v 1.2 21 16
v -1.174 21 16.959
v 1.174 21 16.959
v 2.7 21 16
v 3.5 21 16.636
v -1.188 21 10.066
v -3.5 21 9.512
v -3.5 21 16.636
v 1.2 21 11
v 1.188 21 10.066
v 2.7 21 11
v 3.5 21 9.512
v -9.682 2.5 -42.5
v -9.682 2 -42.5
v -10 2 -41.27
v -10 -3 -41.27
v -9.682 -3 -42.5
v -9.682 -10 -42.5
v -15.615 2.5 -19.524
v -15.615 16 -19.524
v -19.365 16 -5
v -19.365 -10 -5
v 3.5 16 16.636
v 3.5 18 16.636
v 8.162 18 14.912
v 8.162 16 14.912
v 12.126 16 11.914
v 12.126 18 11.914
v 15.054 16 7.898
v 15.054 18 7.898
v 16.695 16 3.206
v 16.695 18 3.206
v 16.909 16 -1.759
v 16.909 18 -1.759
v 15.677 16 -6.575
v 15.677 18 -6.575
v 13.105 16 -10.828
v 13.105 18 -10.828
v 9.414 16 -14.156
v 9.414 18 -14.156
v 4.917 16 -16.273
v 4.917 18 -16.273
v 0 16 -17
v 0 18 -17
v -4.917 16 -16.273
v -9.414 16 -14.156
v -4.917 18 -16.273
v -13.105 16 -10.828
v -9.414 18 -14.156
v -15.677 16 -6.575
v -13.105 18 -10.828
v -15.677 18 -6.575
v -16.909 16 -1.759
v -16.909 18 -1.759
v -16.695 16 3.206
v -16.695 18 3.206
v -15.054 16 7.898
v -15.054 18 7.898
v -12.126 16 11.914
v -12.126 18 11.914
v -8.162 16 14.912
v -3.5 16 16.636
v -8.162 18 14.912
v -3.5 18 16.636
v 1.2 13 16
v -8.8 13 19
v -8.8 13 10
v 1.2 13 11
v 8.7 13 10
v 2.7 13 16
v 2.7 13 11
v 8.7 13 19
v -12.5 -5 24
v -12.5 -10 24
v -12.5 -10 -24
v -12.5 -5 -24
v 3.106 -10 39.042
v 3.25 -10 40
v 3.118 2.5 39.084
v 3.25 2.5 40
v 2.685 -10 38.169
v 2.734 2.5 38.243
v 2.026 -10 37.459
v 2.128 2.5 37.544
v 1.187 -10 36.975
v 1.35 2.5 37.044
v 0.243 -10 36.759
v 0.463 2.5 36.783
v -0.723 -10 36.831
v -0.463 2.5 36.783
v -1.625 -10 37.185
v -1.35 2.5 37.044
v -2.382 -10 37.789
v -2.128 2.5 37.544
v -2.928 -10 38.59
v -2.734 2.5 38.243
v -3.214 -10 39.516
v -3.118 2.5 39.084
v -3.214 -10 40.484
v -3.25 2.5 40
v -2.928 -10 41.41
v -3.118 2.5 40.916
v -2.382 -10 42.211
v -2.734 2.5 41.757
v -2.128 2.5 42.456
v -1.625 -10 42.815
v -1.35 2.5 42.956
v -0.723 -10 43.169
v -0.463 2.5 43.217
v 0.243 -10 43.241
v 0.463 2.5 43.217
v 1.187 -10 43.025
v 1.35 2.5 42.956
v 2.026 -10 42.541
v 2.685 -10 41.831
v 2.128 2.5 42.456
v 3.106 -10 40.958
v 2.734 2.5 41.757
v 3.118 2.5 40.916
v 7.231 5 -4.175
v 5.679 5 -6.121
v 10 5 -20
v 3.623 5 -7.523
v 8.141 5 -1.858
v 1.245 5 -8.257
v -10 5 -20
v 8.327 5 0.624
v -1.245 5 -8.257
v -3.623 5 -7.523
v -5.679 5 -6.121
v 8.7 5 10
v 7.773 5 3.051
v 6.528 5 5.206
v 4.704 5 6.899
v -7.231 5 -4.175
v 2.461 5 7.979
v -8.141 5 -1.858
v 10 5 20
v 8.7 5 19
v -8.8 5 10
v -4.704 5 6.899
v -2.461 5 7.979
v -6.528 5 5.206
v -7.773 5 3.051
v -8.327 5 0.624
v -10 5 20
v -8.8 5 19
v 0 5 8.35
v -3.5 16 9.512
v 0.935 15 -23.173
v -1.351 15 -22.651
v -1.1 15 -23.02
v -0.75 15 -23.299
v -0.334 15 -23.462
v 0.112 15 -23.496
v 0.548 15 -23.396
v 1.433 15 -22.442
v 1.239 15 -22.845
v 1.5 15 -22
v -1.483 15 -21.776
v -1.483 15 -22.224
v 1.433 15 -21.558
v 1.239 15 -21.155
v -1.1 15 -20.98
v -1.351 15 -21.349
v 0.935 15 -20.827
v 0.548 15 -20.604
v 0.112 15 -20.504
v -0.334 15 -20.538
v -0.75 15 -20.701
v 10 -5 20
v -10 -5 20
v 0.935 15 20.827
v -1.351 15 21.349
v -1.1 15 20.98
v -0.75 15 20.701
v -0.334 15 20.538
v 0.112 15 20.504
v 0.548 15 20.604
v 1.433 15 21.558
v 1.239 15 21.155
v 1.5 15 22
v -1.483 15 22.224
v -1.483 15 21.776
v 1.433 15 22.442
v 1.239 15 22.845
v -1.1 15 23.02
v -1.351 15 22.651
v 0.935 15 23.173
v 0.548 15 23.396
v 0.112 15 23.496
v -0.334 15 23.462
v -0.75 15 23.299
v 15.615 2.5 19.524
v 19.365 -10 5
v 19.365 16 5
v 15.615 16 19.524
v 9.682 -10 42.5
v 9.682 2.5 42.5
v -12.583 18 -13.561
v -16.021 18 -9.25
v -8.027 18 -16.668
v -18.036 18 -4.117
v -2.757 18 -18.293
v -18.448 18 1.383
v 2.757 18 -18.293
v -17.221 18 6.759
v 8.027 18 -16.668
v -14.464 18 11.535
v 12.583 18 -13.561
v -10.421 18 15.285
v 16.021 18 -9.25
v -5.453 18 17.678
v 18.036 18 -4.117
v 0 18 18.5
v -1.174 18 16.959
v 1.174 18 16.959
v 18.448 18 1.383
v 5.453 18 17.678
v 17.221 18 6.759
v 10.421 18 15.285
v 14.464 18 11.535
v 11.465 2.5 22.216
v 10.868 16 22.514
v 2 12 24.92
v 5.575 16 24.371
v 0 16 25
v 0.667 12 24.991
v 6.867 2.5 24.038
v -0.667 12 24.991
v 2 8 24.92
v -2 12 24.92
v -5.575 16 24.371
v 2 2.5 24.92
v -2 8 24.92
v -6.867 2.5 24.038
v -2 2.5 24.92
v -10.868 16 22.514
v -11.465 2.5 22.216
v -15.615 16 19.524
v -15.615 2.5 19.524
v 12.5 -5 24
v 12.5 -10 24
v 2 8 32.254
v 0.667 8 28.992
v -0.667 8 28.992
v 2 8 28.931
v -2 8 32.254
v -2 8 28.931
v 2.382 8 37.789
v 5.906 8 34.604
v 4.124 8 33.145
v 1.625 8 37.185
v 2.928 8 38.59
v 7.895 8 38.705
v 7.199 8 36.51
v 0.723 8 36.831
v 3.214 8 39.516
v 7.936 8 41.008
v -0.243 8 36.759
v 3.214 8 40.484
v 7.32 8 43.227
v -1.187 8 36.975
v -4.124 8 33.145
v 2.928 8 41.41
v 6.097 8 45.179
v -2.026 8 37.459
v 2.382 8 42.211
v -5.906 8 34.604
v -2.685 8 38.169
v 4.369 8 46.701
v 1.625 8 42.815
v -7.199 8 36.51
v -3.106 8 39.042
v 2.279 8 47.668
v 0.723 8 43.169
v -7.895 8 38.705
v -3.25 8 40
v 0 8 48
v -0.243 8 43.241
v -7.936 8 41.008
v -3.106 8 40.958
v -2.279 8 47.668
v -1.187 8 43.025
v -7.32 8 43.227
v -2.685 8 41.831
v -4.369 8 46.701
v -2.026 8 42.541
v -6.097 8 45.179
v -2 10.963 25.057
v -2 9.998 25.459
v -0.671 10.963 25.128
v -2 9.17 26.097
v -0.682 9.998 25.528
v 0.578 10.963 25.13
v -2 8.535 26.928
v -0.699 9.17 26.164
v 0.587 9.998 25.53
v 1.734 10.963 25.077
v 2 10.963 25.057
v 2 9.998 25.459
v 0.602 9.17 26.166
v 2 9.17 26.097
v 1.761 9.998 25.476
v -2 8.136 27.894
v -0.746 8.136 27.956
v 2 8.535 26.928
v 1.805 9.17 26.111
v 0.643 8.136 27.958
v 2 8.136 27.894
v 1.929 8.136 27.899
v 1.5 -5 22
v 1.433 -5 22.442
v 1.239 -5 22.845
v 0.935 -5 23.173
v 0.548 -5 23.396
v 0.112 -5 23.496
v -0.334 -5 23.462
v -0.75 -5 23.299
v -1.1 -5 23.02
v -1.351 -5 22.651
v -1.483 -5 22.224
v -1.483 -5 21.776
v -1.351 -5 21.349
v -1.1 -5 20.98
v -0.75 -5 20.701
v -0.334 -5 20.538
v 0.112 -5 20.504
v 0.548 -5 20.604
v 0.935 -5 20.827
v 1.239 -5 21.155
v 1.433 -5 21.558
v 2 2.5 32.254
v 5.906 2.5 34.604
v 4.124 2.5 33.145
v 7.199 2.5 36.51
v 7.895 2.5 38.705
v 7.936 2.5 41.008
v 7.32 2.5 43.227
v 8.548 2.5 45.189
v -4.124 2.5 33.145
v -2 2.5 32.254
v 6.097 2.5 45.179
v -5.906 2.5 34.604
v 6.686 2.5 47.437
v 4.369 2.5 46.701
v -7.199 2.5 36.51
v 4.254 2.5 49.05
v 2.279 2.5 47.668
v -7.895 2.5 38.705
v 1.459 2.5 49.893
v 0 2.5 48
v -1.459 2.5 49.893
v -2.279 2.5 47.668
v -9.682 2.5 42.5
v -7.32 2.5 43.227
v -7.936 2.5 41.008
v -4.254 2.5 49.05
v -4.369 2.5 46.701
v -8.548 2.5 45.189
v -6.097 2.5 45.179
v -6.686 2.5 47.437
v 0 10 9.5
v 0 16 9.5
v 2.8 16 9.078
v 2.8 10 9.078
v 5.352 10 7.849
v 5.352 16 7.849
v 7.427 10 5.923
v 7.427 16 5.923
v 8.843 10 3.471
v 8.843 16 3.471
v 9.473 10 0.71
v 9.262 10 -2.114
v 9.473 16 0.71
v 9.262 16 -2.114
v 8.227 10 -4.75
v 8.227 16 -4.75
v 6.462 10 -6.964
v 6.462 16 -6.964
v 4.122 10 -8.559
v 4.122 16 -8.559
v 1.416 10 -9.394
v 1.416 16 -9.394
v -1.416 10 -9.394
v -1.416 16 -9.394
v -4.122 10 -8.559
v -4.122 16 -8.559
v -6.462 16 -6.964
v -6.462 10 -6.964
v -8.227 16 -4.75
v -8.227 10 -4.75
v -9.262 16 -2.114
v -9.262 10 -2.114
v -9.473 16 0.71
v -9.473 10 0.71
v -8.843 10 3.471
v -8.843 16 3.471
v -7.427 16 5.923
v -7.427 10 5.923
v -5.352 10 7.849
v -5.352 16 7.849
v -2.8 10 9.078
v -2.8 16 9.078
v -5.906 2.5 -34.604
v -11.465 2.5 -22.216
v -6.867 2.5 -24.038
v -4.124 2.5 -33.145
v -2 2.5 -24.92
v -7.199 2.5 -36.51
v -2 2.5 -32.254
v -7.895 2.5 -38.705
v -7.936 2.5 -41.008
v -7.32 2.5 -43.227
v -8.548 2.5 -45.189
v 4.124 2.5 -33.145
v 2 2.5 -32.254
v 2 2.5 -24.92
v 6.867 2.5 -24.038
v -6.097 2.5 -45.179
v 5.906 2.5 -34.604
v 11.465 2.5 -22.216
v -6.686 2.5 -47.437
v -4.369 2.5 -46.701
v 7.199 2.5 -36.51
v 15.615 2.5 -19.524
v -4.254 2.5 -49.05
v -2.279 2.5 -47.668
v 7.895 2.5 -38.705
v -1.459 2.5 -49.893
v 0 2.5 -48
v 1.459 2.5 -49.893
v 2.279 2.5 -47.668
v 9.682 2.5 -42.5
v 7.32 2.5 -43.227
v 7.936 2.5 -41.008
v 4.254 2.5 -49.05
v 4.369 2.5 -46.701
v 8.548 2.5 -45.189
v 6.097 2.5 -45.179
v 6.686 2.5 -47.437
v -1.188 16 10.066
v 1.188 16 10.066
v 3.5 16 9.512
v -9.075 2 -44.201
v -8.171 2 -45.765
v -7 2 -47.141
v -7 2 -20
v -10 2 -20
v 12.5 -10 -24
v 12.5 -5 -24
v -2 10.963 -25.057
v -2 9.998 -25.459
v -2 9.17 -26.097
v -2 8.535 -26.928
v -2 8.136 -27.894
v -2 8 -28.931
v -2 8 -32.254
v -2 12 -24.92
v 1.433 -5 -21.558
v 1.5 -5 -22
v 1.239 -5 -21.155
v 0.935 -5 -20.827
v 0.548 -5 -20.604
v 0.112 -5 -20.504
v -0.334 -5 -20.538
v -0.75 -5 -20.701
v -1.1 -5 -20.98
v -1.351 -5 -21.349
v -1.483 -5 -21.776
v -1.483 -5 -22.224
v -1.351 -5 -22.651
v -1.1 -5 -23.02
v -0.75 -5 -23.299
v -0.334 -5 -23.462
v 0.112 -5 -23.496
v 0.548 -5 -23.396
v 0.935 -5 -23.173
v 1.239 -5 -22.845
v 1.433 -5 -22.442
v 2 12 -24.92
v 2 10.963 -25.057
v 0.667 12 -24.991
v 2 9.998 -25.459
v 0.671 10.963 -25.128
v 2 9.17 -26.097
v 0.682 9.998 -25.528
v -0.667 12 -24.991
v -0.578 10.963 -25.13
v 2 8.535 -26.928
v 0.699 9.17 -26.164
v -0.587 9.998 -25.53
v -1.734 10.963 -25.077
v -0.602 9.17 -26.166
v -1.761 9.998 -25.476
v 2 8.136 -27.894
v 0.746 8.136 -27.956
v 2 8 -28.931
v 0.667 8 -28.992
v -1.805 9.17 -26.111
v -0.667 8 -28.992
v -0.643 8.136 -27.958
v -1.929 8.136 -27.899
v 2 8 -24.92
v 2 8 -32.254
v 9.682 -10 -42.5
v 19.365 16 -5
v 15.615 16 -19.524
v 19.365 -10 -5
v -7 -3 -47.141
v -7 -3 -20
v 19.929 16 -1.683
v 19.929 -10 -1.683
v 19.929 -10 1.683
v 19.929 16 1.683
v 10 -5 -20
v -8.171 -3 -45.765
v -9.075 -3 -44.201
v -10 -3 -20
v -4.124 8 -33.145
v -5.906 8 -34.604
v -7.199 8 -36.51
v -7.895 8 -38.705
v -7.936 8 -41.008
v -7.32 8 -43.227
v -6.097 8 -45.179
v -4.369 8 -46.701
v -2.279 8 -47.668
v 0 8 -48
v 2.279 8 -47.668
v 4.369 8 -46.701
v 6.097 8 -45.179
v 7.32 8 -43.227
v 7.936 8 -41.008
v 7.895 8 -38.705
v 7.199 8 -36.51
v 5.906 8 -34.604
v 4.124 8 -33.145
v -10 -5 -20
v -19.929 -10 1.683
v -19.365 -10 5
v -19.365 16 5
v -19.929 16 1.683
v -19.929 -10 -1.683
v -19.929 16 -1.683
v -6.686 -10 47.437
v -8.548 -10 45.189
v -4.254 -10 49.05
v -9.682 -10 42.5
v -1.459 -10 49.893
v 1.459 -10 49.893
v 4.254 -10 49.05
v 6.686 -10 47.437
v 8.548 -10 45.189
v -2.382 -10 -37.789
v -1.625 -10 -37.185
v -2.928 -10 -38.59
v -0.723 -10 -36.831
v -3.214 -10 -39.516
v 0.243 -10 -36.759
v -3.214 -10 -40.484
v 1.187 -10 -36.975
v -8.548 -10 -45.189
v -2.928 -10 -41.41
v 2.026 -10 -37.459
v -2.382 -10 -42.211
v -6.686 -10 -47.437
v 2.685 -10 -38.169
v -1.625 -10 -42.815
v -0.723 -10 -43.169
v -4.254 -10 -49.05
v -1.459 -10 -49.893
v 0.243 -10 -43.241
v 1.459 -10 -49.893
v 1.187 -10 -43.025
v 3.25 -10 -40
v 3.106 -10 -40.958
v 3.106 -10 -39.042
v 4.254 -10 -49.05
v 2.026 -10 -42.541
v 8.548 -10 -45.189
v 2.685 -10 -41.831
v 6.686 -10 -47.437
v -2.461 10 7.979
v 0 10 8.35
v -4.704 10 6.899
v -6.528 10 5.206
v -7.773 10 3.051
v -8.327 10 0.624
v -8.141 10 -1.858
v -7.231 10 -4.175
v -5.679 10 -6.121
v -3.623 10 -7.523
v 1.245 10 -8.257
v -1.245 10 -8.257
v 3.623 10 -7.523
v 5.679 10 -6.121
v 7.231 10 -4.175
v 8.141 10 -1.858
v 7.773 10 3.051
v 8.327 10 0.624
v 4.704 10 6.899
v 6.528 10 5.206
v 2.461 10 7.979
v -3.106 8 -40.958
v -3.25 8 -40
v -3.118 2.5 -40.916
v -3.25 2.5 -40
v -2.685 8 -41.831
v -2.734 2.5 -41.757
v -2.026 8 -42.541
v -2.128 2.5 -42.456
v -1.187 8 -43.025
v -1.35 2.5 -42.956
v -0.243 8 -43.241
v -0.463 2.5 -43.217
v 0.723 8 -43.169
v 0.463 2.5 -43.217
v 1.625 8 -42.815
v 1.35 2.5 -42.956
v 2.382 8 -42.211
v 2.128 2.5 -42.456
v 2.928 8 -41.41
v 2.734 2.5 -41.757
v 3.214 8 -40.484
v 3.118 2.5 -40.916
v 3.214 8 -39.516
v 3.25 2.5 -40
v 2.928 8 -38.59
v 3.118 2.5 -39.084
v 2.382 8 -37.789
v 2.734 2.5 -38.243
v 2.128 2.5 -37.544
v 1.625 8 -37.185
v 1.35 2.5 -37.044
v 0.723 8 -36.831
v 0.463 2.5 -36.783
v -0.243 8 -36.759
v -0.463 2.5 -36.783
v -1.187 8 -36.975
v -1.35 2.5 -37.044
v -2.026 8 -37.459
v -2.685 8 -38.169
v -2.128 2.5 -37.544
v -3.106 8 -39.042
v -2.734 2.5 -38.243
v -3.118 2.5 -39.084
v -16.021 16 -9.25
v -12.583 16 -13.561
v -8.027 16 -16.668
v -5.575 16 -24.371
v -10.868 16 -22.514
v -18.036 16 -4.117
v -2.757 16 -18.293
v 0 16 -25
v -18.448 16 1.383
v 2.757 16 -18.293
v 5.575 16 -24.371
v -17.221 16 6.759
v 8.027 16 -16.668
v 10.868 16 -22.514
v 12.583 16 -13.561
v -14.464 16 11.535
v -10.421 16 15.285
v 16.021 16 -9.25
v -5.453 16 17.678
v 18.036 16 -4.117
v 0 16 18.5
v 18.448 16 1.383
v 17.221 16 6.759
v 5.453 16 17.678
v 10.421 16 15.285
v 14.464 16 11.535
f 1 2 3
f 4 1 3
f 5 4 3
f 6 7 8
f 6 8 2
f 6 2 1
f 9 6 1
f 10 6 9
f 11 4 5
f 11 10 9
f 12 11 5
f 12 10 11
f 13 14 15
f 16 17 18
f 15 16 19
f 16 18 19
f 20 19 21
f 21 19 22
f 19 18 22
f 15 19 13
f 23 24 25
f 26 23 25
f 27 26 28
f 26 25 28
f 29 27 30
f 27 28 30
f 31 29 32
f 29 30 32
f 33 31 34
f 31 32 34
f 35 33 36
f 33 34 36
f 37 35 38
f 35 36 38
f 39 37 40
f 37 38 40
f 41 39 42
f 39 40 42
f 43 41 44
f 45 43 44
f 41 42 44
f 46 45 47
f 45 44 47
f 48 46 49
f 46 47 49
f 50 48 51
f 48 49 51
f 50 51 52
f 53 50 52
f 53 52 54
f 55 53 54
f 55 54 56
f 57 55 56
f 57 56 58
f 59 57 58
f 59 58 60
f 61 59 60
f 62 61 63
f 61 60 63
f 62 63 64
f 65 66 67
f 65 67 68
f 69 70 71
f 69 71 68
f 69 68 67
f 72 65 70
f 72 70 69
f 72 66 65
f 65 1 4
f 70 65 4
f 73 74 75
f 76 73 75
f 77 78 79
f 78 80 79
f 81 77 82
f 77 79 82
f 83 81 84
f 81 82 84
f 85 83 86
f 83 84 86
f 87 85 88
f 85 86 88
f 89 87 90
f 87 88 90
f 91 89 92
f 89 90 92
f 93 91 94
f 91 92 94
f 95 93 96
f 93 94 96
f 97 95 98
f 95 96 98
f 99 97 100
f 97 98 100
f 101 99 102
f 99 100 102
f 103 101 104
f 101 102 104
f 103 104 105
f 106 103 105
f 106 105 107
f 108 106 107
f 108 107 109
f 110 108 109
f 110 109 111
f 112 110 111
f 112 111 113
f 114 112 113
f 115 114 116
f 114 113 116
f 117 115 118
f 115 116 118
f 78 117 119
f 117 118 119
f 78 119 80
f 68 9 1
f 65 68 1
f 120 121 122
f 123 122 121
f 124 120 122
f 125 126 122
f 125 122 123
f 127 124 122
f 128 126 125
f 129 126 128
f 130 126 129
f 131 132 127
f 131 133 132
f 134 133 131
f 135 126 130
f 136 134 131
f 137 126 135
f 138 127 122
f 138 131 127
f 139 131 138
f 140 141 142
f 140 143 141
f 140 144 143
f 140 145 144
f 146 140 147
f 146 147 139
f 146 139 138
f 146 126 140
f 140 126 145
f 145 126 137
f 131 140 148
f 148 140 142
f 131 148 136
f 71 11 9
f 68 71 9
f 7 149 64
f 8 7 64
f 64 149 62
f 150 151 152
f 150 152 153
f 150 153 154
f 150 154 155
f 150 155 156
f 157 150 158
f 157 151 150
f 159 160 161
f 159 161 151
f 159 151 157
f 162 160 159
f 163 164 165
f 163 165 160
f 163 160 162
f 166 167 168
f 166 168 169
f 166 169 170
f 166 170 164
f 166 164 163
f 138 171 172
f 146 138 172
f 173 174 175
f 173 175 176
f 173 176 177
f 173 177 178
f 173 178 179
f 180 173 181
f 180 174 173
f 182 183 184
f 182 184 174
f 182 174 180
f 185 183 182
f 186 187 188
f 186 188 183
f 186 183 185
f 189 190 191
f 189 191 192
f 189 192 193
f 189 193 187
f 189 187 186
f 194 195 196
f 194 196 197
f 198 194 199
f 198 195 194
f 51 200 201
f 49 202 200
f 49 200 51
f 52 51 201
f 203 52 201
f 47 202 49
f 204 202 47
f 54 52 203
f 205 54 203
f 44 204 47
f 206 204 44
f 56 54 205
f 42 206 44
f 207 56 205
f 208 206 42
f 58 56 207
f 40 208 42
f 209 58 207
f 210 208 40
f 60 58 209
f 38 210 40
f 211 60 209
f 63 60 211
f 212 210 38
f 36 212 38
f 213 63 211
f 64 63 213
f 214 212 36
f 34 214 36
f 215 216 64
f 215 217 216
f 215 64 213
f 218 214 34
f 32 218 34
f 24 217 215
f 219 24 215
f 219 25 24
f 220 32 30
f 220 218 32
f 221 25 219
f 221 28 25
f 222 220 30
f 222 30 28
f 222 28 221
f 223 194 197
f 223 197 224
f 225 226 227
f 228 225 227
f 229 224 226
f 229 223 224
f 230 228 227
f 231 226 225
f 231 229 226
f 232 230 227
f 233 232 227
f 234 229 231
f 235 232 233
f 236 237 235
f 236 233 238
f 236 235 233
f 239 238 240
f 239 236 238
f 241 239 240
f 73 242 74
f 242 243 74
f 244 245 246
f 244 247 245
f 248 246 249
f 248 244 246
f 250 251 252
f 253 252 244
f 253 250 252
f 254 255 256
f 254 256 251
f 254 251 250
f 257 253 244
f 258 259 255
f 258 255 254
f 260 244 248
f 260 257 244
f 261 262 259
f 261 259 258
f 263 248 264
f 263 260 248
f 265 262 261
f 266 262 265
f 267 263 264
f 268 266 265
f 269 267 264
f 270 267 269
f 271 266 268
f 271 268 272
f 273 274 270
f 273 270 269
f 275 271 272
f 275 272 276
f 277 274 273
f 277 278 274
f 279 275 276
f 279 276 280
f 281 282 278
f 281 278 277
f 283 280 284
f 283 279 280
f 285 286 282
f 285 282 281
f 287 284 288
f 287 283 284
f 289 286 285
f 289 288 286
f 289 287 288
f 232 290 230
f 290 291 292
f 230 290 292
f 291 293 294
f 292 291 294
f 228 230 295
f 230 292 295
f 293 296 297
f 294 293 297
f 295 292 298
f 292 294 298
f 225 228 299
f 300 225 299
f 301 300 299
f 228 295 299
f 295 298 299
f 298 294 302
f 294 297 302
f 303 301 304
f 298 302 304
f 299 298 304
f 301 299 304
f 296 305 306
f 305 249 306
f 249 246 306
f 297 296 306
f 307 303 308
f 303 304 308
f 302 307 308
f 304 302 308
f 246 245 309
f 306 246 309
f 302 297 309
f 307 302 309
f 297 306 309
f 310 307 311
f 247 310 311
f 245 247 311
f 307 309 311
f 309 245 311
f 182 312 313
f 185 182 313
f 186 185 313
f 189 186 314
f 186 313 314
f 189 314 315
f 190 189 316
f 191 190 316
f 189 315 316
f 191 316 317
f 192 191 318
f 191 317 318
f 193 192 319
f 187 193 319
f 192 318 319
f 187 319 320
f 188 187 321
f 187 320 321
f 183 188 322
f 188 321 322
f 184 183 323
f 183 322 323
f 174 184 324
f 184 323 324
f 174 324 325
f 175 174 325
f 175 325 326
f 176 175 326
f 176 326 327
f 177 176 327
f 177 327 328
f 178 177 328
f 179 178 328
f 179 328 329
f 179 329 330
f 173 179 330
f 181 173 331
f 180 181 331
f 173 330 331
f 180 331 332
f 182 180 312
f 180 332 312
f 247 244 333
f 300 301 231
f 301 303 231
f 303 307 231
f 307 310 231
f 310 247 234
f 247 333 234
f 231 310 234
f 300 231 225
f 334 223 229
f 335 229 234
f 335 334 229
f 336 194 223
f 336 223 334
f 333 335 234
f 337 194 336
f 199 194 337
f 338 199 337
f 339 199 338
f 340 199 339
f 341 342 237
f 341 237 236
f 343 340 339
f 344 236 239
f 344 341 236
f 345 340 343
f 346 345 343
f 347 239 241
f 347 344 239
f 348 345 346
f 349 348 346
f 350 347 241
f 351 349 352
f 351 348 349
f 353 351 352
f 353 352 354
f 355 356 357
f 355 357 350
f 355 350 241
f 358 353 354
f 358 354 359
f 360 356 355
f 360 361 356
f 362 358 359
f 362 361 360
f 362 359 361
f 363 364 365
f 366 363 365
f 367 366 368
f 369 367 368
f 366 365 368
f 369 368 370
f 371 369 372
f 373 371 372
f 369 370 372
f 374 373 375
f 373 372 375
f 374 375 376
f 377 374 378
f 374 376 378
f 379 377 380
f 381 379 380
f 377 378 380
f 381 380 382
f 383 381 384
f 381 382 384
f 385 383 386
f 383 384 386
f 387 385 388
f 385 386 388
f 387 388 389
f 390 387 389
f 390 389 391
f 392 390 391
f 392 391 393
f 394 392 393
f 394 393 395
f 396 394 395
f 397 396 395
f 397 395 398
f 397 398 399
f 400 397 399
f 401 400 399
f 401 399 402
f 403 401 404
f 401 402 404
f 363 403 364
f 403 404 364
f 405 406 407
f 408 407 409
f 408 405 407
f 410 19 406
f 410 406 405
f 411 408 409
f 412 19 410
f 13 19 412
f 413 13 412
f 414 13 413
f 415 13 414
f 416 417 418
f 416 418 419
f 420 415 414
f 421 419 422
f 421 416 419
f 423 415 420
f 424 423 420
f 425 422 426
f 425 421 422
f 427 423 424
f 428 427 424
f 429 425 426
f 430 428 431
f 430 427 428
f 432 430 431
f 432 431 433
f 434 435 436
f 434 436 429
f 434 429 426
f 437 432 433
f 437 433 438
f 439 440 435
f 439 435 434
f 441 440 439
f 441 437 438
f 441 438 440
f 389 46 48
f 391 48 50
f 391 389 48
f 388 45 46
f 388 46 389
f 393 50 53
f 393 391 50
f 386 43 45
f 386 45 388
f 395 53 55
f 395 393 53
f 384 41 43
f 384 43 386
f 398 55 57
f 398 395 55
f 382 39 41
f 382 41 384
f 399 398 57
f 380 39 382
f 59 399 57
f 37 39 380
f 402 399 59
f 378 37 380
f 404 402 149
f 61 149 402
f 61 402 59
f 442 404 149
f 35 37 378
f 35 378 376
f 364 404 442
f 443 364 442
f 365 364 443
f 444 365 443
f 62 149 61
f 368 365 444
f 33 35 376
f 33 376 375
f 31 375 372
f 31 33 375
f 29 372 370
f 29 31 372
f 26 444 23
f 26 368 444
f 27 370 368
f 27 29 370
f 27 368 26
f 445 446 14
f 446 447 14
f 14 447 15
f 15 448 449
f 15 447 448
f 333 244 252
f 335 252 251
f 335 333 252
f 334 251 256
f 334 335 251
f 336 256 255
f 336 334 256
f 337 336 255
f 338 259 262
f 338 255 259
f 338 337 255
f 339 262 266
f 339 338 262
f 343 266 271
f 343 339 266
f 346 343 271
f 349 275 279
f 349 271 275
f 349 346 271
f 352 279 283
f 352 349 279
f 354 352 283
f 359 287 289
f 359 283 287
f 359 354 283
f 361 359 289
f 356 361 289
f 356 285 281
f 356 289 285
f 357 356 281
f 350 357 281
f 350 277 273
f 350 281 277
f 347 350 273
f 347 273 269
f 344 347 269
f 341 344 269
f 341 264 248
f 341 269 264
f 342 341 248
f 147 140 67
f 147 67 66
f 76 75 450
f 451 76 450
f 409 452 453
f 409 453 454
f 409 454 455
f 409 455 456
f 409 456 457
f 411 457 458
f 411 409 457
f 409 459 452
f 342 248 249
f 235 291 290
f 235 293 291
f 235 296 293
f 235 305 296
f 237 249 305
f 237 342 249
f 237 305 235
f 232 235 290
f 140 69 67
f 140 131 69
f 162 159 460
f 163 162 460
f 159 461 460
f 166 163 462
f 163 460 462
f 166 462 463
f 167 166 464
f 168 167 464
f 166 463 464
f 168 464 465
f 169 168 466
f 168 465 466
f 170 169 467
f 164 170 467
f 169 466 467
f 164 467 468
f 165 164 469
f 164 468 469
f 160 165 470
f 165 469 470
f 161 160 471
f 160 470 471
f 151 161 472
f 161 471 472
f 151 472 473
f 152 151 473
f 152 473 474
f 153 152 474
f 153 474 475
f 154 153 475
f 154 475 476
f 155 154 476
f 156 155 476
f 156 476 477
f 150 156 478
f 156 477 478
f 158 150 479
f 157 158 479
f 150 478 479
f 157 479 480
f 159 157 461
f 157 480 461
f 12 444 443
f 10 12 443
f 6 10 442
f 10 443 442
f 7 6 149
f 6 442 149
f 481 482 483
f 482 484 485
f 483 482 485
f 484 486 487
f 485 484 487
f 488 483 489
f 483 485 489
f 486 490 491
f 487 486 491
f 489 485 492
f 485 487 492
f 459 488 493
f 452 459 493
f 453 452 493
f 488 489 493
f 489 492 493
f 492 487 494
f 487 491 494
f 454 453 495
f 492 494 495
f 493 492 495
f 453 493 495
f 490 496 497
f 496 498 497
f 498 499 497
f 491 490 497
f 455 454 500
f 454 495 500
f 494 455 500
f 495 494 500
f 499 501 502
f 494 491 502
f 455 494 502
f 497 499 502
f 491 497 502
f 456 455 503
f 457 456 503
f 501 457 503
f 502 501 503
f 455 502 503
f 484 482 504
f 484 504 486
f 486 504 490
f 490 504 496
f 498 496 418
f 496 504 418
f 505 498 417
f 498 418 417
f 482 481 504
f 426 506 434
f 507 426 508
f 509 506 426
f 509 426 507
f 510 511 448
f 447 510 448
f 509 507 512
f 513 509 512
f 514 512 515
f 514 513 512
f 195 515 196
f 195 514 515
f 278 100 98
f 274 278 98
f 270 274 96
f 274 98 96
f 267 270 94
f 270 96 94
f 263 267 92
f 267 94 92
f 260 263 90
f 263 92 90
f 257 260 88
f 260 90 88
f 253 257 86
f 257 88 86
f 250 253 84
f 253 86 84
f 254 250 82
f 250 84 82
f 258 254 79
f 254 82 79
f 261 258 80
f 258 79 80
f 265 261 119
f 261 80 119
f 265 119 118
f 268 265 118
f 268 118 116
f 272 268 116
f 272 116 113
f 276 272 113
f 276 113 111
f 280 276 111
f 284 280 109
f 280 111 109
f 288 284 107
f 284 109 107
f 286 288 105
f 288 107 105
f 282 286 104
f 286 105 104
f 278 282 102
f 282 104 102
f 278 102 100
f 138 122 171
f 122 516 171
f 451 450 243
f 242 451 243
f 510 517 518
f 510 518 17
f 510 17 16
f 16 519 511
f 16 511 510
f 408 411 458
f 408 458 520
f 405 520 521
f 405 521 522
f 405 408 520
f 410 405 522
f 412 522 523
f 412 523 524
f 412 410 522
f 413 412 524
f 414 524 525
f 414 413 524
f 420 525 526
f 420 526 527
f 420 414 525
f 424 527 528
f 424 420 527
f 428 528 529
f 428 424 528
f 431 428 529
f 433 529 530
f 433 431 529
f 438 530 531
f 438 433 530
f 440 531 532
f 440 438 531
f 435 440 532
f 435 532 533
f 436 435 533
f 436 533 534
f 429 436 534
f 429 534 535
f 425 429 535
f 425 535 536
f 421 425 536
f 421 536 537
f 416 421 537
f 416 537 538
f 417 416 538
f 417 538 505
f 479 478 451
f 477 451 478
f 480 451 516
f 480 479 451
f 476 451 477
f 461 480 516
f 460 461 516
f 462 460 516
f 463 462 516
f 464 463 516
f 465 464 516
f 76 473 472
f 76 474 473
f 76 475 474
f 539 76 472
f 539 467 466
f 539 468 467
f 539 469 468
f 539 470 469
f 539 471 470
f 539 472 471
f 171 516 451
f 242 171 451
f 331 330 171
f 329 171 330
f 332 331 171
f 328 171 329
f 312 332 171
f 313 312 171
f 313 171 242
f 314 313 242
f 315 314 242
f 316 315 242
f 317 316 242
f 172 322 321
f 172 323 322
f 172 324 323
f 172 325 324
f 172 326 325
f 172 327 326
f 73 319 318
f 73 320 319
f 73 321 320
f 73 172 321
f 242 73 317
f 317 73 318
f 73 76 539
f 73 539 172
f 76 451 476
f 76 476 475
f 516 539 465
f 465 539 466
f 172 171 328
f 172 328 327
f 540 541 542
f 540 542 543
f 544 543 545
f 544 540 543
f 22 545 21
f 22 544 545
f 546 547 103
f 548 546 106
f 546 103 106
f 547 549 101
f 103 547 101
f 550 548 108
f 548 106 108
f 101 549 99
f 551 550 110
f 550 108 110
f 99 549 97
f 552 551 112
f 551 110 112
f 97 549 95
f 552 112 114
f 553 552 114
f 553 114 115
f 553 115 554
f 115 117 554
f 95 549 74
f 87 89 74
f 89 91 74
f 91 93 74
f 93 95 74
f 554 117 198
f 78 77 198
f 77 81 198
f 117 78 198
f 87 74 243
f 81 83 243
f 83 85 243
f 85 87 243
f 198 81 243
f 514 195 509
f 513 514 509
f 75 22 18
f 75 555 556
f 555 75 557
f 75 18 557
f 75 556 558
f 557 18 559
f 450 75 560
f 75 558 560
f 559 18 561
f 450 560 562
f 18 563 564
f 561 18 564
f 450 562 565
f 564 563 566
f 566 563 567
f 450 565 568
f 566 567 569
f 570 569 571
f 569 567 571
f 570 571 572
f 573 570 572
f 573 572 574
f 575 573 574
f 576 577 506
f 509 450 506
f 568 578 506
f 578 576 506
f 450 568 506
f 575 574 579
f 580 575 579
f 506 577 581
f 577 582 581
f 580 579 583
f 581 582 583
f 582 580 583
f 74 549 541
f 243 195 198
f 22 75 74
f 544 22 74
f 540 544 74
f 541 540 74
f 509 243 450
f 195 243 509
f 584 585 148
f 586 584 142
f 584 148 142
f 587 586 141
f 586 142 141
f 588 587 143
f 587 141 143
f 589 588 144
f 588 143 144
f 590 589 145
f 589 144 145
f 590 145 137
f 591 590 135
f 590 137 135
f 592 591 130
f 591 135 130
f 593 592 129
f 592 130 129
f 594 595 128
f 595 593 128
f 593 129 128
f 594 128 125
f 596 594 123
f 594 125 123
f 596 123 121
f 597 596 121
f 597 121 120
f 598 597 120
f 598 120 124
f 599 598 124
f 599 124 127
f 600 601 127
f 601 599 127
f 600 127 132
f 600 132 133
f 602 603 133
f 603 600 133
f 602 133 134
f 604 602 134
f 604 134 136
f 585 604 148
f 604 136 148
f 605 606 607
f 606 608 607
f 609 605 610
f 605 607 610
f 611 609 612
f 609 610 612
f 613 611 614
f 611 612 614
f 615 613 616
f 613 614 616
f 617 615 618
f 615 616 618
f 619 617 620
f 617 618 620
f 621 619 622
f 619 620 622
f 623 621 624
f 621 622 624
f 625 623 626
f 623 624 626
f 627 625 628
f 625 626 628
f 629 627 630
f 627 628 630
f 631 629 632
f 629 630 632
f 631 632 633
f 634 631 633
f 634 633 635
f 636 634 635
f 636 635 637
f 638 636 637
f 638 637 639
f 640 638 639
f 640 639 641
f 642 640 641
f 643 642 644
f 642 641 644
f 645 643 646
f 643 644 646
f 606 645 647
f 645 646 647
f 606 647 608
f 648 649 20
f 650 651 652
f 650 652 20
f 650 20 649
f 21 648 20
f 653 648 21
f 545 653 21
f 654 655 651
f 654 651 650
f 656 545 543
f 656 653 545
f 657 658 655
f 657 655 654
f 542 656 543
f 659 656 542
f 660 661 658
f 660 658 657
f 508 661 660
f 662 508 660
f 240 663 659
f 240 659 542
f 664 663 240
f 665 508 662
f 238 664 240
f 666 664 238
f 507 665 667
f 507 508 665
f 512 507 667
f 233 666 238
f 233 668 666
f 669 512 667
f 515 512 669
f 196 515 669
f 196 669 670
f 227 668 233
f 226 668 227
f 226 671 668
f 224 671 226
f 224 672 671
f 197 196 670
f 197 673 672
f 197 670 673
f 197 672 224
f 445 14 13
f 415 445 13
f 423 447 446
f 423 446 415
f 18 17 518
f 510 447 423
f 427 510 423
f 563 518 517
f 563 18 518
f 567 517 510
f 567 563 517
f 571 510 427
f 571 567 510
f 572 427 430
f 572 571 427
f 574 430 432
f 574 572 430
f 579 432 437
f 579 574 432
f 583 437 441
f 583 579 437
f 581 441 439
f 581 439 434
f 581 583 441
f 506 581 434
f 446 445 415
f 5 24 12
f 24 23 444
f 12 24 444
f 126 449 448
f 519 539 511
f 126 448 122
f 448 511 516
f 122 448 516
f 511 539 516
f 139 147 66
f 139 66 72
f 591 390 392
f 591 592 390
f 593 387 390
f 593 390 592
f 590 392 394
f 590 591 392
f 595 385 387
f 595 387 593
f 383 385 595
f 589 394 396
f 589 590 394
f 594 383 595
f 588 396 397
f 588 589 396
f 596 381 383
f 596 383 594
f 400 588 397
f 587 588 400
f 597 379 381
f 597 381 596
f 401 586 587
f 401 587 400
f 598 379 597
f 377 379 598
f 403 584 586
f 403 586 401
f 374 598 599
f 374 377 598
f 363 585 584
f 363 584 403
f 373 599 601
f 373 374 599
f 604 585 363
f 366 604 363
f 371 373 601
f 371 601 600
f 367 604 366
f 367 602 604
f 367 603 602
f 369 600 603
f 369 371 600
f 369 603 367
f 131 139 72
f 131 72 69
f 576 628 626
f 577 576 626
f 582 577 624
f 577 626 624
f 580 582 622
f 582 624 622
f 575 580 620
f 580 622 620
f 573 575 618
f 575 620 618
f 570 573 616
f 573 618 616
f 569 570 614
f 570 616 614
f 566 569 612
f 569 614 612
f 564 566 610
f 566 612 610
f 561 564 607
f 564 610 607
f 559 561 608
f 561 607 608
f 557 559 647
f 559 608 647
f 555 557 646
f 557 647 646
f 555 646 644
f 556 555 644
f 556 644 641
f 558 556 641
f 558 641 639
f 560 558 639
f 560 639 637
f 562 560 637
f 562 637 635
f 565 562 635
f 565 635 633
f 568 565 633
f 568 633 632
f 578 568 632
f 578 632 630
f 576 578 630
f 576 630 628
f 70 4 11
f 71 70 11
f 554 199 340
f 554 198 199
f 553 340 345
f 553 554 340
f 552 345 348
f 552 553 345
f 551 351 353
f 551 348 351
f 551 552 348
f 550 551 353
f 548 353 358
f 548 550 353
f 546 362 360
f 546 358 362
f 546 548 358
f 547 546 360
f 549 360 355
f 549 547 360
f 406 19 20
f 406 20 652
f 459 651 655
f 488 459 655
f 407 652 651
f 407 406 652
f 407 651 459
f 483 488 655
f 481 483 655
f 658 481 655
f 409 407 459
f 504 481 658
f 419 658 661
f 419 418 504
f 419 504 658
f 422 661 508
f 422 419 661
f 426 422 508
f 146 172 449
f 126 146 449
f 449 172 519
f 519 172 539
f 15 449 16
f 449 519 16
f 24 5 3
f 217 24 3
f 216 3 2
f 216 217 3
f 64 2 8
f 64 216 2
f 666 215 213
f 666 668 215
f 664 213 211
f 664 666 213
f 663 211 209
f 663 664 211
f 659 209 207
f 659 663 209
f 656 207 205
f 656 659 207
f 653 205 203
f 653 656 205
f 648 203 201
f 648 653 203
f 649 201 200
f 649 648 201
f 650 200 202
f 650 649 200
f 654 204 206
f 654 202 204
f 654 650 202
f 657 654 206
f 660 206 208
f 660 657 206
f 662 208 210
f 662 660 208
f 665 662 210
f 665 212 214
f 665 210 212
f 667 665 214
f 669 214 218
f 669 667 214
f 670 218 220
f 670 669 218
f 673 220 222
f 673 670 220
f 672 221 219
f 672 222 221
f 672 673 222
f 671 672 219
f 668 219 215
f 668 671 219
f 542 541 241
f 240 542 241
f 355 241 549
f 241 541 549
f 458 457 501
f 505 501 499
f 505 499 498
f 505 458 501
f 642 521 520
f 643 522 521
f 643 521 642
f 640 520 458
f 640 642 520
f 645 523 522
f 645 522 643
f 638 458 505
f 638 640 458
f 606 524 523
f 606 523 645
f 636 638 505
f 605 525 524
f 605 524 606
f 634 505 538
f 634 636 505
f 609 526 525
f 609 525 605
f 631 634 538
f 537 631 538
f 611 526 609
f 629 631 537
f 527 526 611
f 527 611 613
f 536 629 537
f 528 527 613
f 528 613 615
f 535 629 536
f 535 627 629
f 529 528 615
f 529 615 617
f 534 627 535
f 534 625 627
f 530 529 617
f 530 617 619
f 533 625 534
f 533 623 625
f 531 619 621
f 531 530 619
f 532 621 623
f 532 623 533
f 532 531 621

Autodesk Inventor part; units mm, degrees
ref_plane "YZ Plane" through (0, 0, 0) normal (1, 0, 0) x (0, 1, 0)
ref_plane "XZ Plane" through (0, 0, 0) normal (0, 1, 0) x (-1, 0, 0)
ref_plane "XY Plane" through (0, 0, 0) normal (0, 0, 1) x (1, 0, 0)
sketch "Sketch1" plane through (0, 0, 0) normal (1, 0, 0) x (0, 1, 0)
  line L0 (121, 3) -> (1, 3)
  line L1 (1, 3) -> (1, -3)
  line L2 (1, -3) -> (121, -3)
  line L3 (121, -3) -> (121, 3)
  line L4 (121, 3) -> (1, -3) construction
  line L5 (1, 3) -> (121, -3) construction
  line L6 (10, 8.35) -> (0, 8.35)
  line L7 (0, 8.35) -> (0, 20)
  line L8 (10, 8.35) -> (10, 9.5)
  line L9 (10, 9.5) -> (16, 9.5)
  line L10 (16, 9.5) -> (16, 17)
  line L11 (16, 17) -> (18, 17)
  line L12 (18, 17) -> (18, 18.5)
  line L13 (18, 18.5) -> (16, 18.5)
  line L14 (16, 18.5) -> (16, 20)
  line L15 (16, 20) -> (0, 20)
  line L16 (-36.2, 0) -> (147.2, 0) projected
  line L17 (16, 20) -> (31, 20)
  line L18 (18, 17) -> (31, 17)
  line L19 (75, 9.45) -> (69, 9.45)
  line L20 (69, 9.45) -> (69, 8.35)
  line L21 (69, 8.35) -> (66, 8.35)
  line L22 (75, 9.45) -> (75, 12.45)
  arc A0 (75, 12.45) -> (31, 20) centre (31, -111.9869) ccw
  arc A1 (59.1084, 13.9001) -> (31, 17) centre (31, -111.9869) ccw
  arc A2 (66, 8.35) -> (59.1084, 13.9001) centre (56.9292, 4.1404) ccw
  line L23 (0, 20) -> (-10, 20)
  line L24 (-10, 20) -> (-10, 8.35)
  line L25 (-10, 8.35) -> (0, 8.35)
  line L26 (0, 8.35) -> (0, 20)
  point P0 (0, 0)
  point P1 (61, 0)
  point P2 (61, 0)
  dimension "d0" = 120
  dimension "d1" = 6
  dimension "d5" = 8.35
  dimension "d6" = 9.5
  dimension "d7" = 1.5
  dimension "d8" = 1.5
  dimension "d9" = 20
  dimension "d10" = 6
  dimension "d11" = 2
  dimension "d13" = 10
  dimension "d14" = 1
  dimension "d15" = 6
  dimension "d16" = 3
  dimension "d17" = 9.45
  dimension "d18" = 3
  dimension "d19" = 8.35
  dimension "d20" = 15
  dimension "d21" = 7.5
  dimension "d22" = 75
  dimension "d23" = 10
  dimension "d42" = 10
  dimension "d43" = 8.35
revolve "Revolution1" add sketch "Sketch1" angle 360 about axis through (0, -10, 0) along (0, 1, 0) contours L6 L7 L15 L14 L13 L12 L11 L10 L9 L8 | L25 L24 L23 L7
sketch "Sketch2" plane through (0, 0, 0) normal (0, 1, 0) x (-1, 0, 0)
  circle A0 centre (0, 0) radius 20 projected
  circle A1 centre (0, 40) radius 3.25
  line L0 (28, 0) -> (-28, 0) projected
  line L1 (19.3649, 5) -> (9.6825, 42.5)
  line L2 (-19.3649, 5) -> (-9.6825, 42.5)
  arc A2 (9.6825, 42.5) -> (-9.6825, 42.5) centre (0, 40) ccw
  circle A3 centre (0, 40) radius 8
  arc A4 (15.6149, 19.5237) -> (-15.6149, 19.5237) centre (0, 0) ccw
  line L3 (2, 32.254) -> (2, 24.9199)
  line L4 (-2, 32.254) -> (-2, 24.9199)
  dimension "d25" = 6.5
  dimension "d28" = 10
  dimension "d29" = 16
  dimension "d30" = 5
  dimension "d31" = 40
  dimension "d34" = 4
extrude "Extrusion1" add sketch "Sketch2" along normal blind 2.5 and the other way blind 10 contours A0 L2 A4 L1 | A4 L3 A3 L4 L2 A2 L1 | A4 L4 A3 L3 | A3 | A1
extrude "Extrusion2" add sketch "Sketch2" along normal up to surface (26 mm away) from surface at -10 contours A0 L2 A4 L1
extrude "Extrusion3" add sketch "Sketch2" along normal blind 8 contours A4 L4 A3 L3 | A3
fillet "Fillet1" radius 4 1 edges at (0, 8, 25)
mirror "Mirror1" about plane through (0, 0, 0) normal (0, 0, 1) of "Extrusion2", "Extrusion3", "Fillet1", "Extrusion1"
sketch "Sketch3" plane through (0, -10, 0) normal (0, -1, 0) x (0, 0, 1)
  line L0 (5, -19.3649) -> (42.5, -9.6825) projected
  circle A0 centre (0, 0) radius 8.35 projected
  arc A1 (-5, -19.3649) -> (5, -19.3649) centre (0, 0) ccw projected
  line L1 (5, -19.3649) -> (42.5, -9.6825) projected
  line L2 (42.5, 9.6825) -> (5, 19.3649) projected
  arc A2 (5, 19.3649) -> (-5, 19.3649) centre (0, 0) ccw projected
  line L3 (-42.5, 9.6825) -> (-5, 19.3649) projected
  line L4 (-5, -19.3649) -> (-42.5, -9.6825) projected
  circle A3 centre (0, 0) radius 8.35 projected
  arc A4 (-5, -19.3649) -> (5, -19.3649) centre (0, 0) ccw projected
  line L5 (5, -19.3649) -> (42.5, -9.6825) projected
  line L6 (42.5, 9.6825) -> (5, 19.3649) projected
  arc A5 (5, 19.3649) -> (-5, 19.3649) centre (0, 0) ccw projected
  line L7 (-42.5, 9.6825) -> (-5, 19.3649) projected
  line L8 (-5, -19.3649) -> (-42.5, -9.6825) projected
  line L9 (20, 10) -> (-20, 10)
  line L10 (-20, 10) -> (-20, -10)
  line L11 (-20, -10) -> (20, -10)
  line L12 (20, -10) -> (20, 10)
  arc A6 (42.5, -9.6825) -> (42.5, 9.6825) centre (40, 0) ccw projected
  arc A7 (-42.5, 9.6825) -> (-42.5, -9.6825) centre (-40, 0) ccw projected
  arc A8 (42.5, -9.6825) -> (42.5, 9.6825) centre (40, 0) ccw projected
  arc A9 (-42.5, 9.6825) -> (-42.5, -9.6825) centre (-40, 0) ccw projected
  point P0 (15.6149, 19.5237)
  dimension "d44" = 0
  dimension "d45" = 0
  dimension "d59" = 40
  dimension "d60" = 10
  dimension "d61" = 10
extrude "Extrusion5" cut sketch "Sketch3" against normal blind 15 contours L12 L11 L10 L9
sketch "Sketch4" plane through (0, -10, 0) normal (0, -1, 0) x (0, 0, 1)
  line L0 (-20, -10) -> (-20, 10) projected
  line L1 (-20, 10) -> (20, 10) projected
  line L2 (20, 10) -> (20, -10) projected
  line L3 (20, -10) -> (-20, -10) projected
  arc A0 (-5, -19.3649) -> (5, -19.3649) centre (0, 0) ccw projected
  line L4 (5, -19.3649) -> (42.5, -9.6825) projected
  line L5 (42.5, 9.6825) -> (5, 19.3649) projected
  arc A1 (5, 19.3649) -> (-5, 19.3649) centre (0, 0) ccw projected
  line L6 (-42.5, 9.6825) -> (-5, 19.3649) projected
  line L7 (-5, -19.3649) -> (-42.5, -9.6825) projected
  line L8 (24, 12.5) -> (-24, 12.5)
  line L9 (-24, 12.5) -> (-24, -12.5)
  line L10 (-24, -12.5) -> (24, -12.5)
  line L11 (24, -12.5) -> (24, 12.5)
  arc A2 (42.5, -9.6825) -> (42.5, 9.6825) centre (40, 0) ccw projected
  arc A3 (-42.5, 9.6825) -> (-42.5, -9.6825) centre (-40, 0) ccw projected
  dimension "d51" = 4
  dimension "d52" = 2.5
  dimension "d53" = 4
  dimension "d54" = 2.5
extrude "Extrusion6" cut sketch "Sketch4" against normal blind 5 contours L11 L10 L9 L8
sketch "Sketch6" plane through (0, 16, 0) normal (0, 1, 0) x (1, 0, 0)
  circle A0 centre (0, 0) radius 17 projected
  circle A1 centre (0, 0) radius 9.5 projected
  line L0 (3.5, -16.6358) -> (3.5, -10.1358)
  line L1 (-3.5, -10.1358) -> (-3.5, -16.6358)
  arc A2 (-3.5, -16.6358) -> (3.5, -16.6358) centre (0, 0) ccw
  arc A3 (-3.5, -9.5123) -> (3.5, -9.5123) centre (0, 0) ccw
  line L2 (-3.5, -9.5123) -> (-3.5, -10.1358)
  line L3 (-12.5, 24) -> (-12.5, -24) projected
  line L4 (3.5, -9.5123) -> (3.5, -10.1358)
  dimension "d69" = 3.5
  dimension "d70" = 3.5
  dimension "d75" = 0
  dimension "d76" = 0
  dimension "d77" = 40.402
extrude "Extrusion7" add sketch "Sketch6" along normal blind 5 contours L1 L2 A3 L4 L0 A0
sketch "Sketch7" plane through (0, 21, 0) normal (0, 1, 0) x (1, 0, 0)
  line L0 (1.2, -16) -> (2.7, -16)
  line L1 (2.7, -16) -> (2.7, -11)
  line L2 (2.7, -11) -> (1.2, -11)
  line L3 (1.2, -11) -> (1.2, -16)
  arc A0 (-3.5, -9.5123) -> (3.5, -9.5123) centre (0, 0) ccw projected
  dimension "d79" = 11
  dimension "d80" = 5
  dimension "d81" = 1.5
  dimension "d82" = 1.2
extrude "Extrusion8" cut sketch "Sketch7" against normal up to surface (16 mm away)
sketch "Sketch8" plane through (0, 2.5, 0) normal (0, 1, 0) x (1, 0, 0)
  circle A0 centre (0, -40) radius 3.25 projected
  circle A1 centre (0, 40) radius 3.25 projected
  point P0 (0, 0)
extrude "Extrusion9" cut sketch "Sketch8" against normal up to surface (12.5 mm away)
sketch "Sketch9" plane through (-10, 5, -20) normal (0, 0, 1) x (1, 0, 0)
  point P0 (10, -5)
sketch "Sketch10" plane through (-10, 5, -20) normal (0, 0, 1) x (1, 0, 0)
  line L0 (0, -10) -> (0, 0) projected
  line L1 (0, -8) -> (3, -8)
  line L2 (3, -8) -> (3, -3)
  line L3 (3, -3) -> (0, -3)
  line L4 (0, -3) -> (0, -8)
  line L5 (0, -10) -> (20, -10) projected
  line L6 (20, -10) -> (20, 0) projected
  line L7 (20, 0) -> (0, 0) projected
  line L8 (0, -10) -> (0, 0) projected
  point P0 (10, -5)
  point P1 (0, -2.5)
  dimension "d87" = 2
  dimension "d88" = 5
  dimension "d89" = 3
extrude "Extrusion10" cut sketch "Sketch10" against normal blind 30 contours L0 L3 L2 L1
sketch "Sketch11" plane through (0, -5, 0) normal (0, -1, 0) x (1, 0, 0)
  line L0 (-10, -20) -> (10, -20) projected
  line L1 (10, -20) -> (10, 20) projected
  line L2 (-10, -20) -> (10, -20) projected
  line L3 (-10, 20) -> (-10, -20) projected
  line L4 (10, 20) -> (-10, 20) projected
  line L5 (-12.5, -24) -> (-12.5, 24) projected
  line L6 (12.5, -24) -> (-12.5, -24) projected
  line L7 (12.5, 24) -> (12.5, -24) projected
  line L8 (-12.5, 24) -> (12.5, 24) projected
  circle A0 centre (0, -22) radius 1.5
  circle A1 centre (0, 22) radius 1.5
  point P0 (0, 0)
  dimension "d92" = 3
  dimension "d93" = 3
  dimension "d94" = 22
  dimension "d95" = 22
  dimension "d96" = 0
  dimension "d97" = 0
extrude "Extrusion11" cut sketch "Sketch11" against normal blind 20 contours A0 | A1
sketch "Sketch12" plane through (-19.3649, -10, -5) normal (-0.9682, 0, -0.25) x (-0.25, 0, 0.9682)
  point P0 (0, 10)
sketch "Sketch14" plane through (0, 5, 0) normal (0, -1, 0) x (1, 0, 0)
  line L0 (2.7, 16) -> (2.7, 11) projected
  line L1 (1.2, 11) -> (1.2, 16) projected
  line L2 (2.7, 11) -> (1.2, 11) projected
  line L3 (1.2, 16) -> (2.7, 16) projected
  line L4 (-8.8, 19) -> (8.7, 19)
  line L5 (8.7, 19) -> (8.7, 10)
  line L6 (8.7, 10) -> (-8.8, 10)
  line L7 (-8.8, 10) -> (-8.8, 19)
  line L8 (-10, 20) -> (10, 20) projected
  point P0 (0, 0)
  dimension "d101" = 1
  dimension "d102" = 6
  dimension "d103" = 10
  dimension "d106" = 1
extrude "Extrusion12" cut sketch "Sketch14" against normal blind 8
equation "\"d61\" = d60"
equation "\"d54\" = d52"
equation "\"d70\" = d69"
equation "\"d95\" = d94"
properties part number "Base"
